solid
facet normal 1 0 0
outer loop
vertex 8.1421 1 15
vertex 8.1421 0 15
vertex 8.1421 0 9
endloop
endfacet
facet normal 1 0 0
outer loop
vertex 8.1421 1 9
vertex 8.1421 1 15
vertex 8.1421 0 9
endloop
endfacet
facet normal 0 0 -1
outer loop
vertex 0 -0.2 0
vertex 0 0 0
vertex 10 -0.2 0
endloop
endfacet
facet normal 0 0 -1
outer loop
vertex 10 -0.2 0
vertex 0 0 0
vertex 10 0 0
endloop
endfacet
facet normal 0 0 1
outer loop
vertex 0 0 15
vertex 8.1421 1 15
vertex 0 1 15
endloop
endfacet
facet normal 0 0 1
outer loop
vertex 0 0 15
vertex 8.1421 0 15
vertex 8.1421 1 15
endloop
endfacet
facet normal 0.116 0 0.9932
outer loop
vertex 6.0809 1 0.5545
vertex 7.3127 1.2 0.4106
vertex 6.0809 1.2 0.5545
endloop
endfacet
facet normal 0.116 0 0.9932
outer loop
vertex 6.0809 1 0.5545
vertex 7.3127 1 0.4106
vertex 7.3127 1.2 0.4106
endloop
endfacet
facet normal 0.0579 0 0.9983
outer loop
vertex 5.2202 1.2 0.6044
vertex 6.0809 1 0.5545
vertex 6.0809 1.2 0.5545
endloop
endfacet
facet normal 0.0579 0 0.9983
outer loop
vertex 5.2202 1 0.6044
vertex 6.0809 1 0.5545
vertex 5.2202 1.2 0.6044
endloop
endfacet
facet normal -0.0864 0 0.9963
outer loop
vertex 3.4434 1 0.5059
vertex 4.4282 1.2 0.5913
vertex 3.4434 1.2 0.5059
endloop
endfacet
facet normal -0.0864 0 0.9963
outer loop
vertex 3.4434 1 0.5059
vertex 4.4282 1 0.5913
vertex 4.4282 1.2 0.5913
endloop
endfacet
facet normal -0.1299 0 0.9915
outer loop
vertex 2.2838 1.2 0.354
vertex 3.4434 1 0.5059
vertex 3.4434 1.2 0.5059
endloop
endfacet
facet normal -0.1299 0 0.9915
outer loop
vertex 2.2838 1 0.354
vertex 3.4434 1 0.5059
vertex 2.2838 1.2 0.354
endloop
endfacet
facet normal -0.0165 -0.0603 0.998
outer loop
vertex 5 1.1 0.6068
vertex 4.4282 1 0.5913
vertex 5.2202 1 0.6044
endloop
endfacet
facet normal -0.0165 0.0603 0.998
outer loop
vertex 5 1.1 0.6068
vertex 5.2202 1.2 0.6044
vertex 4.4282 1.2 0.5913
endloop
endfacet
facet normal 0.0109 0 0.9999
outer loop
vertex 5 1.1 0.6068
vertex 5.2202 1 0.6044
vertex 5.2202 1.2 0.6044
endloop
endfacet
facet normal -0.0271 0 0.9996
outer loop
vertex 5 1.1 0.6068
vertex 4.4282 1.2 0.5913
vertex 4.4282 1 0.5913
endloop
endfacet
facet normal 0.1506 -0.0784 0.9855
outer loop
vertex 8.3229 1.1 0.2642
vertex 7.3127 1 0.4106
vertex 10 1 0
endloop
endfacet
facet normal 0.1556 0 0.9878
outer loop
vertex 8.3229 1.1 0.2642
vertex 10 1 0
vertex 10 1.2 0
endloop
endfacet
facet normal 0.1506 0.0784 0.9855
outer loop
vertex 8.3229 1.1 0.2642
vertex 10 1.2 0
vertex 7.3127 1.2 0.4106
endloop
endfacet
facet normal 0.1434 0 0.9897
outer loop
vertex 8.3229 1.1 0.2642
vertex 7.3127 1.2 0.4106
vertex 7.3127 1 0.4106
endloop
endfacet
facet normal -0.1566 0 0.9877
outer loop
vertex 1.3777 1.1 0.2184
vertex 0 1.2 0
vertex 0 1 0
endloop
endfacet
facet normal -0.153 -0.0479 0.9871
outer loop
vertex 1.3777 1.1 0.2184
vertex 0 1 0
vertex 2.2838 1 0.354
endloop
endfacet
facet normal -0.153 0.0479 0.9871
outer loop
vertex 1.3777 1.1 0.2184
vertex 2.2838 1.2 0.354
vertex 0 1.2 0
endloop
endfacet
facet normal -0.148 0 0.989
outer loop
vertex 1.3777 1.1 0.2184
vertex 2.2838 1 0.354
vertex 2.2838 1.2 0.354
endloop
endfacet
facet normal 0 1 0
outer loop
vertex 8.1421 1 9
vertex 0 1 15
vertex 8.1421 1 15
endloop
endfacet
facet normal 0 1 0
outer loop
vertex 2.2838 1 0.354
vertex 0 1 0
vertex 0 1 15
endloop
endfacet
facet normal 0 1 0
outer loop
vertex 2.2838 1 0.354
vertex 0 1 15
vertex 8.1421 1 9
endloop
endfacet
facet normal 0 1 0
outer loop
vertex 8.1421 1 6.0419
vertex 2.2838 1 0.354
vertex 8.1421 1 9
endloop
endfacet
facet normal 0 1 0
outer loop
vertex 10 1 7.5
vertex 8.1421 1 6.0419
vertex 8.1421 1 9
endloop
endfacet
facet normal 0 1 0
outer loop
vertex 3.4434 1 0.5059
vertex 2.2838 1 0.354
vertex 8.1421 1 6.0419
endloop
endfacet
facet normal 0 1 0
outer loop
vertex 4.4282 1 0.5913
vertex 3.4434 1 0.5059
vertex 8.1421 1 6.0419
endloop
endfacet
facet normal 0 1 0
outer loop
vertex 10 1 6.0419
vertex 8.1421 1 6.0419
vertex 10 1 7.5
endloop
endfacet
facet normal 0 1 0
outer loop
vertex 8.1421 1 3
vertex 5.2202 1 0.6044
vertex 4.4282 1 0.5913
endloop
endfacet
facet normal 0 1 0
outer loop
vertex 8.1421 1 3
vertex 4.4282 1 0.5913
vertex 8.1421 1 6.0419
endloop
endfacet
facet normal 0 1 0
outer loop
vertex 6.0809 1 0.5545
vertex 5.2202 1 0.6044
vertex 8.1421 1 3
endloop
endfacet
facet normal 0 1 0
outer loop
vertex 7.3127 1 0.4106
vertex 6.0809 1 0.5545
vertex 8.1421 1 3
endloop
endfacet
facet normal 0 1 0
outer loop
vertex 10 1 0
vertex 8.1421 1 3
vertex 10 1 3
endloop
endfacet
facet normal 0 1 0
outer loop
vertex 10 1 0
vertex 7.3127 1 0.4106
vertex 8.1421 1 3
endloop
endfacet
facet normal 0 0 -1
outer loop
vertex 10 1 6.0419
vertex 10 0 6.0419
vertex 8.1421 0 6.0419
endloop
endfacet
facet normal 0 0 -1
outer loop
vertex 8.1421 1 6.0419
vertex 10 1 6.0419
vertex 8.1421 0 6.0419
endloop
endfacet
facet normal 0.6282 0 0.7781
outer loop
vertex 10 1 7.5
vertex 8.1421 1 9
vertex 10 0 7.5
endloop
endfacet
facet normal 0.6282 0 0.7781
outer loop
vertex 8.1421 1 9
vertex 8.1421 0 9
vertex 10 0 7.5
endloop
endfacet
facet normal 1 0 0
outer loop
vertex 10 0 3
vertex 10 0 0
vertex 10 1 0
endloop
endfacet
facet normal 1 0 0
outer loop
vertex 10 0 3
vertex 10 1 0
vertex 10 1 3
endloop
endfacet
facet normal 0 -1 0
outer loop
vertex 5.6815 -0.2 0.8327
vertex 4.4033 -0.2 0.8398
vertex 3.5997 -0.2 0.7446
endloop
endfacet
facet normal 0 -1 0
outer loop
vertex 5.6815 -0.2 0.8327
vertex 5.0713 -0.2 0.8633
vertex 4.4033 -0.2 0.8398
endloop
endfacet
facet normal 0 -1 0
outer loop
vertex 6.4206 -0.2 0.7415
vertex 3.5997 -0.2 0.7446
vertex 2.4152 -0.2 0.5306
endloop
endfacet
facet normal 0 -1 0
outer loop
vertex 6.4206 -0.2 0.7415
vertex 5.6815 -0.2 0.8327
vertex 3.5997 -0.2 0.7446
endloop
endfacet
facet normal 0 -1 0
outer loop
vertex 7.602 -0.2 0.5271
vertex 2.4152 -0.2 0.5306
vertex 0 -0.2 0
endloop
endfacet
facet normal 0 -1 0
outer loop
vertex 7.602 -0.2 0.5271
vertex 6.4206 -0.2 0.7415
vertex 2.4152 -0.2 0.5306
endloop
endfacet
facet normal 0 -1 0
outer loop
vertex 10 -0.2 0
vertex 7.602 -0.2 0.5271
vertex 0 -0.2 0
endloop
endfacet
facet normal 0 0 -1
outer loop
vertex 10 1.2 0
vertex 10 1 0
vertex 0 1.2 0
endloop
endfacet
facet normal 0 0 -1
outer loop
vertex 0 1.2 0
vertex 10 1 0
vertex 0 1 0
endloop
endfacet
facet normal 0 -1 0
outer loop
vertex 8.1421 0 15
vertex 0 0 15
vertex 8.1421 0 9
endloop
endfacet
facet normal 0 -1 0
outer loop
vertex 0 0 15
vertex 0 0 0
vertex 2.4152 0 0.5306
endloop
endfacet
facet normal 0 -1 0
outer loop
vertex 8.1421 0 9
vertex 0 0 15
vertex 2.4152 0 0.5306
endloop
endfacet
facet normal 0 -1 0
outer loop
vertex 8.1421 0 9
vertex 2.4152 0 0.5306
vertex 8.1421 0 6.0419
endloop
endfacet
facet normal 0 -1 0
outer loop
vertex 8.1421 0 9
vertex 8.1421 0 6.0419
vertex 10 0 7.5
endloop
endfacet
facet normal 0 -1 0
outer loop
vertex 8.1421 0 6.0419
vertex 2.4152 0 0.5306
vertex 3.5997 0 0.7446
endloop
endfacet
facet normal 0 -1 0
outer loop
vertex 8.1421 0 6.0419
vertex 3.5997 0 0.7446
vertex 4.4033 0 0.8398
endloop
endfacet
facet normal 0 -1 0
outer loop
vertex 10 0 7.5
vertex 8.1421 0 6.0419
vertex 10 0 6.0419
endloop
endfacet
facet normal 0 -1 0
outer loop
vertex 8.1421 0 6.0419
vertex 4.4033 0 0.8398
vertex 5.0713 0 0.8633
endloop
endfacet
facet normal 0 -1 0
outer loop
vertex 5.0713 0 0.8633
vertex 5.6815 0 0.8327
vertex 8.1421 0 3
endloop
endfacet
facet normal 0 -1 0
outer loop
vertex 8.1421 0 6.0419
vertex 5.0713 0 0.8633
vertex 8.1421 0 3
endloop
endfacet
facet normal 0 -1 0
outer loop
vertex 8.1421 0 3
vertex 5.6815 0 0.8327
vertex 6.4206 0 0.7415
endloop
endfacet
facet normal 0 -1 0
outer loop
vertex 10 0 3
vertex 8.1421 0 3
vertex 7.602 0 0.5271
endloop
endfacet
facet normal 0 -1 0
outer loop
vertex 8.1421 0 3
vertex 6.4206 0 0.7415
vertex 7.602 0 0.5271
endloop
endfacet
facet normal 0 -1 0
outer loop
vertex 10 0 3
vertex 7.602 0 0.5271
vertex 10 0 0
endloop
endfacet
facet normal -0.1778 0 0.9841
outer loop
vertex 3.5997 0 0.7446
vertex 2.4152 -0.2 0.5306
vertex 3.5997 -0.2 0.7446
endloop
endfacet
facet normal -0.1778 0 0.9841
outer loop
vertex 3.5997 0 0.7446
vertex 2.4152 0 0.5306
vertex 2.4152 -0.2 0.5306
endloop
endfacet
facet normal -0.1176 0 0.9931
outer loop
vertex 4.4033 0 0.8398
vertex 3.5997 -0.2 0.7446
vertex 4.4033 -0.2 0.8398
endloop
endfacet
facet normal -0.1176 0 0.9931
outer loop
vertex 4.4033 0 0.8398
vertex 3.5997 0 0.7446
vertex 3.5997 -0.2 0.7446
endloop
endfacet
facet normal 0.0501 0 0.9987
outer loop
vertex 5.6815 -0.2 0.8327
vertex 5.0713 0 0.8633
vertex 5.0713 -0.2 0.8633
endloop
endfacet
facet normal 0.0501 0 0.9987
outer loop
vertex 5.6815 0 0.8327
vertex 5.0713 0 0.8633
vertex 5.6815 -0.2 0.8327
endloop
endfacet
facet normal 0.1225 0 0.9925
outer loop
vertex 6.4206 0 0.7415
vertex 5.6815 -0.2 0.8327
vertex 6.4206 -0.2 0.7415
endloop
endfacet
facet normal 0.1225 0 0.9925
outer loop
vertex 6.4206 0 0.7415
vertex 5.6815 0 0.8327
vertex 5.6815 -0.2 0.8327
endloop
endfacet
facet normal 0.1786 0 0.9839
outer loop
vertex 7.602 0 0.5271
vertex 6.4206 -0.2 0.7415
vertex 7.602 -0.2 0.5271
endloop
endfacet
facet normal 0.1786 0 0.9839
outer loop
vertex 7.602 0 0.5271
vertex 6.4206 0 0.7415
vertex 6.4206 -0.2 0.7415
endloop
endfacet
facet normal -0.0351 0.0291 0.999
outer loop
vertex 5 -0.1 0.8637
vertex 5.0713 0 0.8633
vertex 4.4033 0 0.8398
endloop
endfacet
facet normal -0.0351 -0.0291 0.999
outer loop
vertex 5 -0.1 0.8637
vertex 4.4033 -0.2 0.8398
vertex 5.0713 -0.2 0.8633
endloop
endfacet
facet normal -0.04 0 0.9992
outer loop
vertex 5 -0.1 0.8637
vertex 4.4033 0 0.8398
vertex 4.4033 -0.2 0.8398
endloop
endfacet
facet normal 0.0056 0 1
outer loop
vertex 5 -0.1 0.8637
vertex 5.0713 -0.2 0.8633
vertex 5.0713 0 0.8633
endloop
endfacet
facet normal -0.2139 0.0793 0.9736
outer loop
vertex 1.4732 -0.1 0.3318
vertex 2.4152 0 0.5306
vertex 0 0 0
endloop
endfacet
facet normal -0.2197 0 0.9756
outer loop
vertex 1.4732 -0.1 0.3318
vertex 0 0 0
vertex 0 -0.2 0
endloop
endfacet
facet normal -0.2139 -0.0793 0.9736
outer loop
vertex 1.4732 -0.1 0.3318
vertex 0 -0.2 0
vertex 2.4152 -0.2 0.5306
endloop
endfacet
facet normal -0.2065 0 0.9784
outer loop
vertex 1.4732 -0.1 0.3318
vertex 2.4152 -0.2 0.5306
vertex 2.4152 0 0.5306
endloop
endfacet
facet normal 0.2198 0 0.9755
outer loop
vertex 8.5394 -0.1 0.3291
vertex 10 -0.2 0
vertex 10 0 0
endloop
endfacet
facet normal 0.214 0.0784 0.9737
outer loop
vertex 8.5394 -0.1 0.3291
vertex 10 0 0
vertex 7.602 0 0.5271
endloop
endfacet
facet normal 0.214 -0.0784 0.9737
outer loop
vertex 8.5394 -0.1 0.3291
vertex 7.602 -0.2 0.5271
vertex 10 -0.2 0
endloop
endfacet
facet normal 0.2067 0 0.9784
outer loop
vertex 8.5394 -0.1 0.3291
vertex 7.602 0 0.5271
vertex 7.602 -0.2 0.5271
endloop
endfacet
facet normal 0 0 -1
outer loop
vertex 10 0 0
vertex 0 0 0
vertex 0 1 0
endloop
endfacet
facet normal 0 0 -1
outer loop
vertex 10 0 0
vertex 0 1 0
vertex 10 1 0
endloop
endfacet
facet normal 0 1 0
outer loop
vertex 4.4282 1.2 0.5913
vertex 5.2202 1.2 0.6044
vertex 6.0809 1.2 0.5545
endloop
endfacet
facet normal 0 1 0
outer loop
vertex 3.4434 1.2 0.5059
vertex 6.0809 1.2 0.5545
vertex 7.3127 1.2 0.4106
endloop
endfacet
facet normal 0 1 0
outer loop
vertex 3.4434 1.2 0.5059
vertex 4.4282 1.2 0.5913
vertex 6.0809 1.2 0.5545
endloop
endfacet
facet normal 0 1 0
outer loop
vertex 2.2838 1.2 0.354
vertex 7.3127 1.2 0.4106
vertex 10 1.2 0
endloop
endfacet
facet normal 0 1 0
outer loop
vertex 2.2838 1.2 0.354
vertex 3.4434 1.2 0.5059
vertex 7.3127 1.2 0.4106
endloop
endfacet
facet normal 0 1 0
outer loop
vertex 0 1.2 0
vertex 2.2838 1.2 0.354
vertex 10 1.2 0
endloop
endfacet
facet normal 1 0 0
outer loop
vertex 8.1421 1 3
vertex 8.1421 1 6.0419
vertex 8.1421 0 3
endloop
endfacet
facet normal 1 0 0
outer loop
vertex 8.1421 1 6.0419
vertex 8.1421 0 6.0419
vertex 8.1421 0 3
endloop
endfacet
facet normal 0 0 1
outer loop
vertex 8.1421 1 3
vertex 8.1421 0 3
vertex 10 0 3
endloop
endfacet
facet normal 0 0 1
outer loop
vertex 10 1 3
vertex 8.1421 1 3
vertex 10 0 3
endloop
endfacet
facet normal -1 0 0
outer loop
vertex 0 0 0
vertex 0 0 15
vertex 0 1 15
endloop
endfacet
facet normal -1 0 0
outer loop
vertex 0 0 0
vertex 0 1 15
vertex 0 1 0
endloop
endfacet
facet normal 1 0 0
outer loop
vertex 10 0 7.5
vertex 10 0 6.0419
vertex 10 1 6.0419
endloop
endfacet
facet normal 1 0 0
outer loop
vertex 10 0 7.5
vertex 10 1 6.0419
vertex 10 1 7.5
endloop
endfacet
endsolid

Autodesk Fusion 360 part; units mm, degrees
sketch "草图1" plane through (0, 0, 0) normal (0, 1, 0) x (1, 0, 0)
  line L0 (0, 0) -> (10, 0)
  line L1 (8.1421, -15) -> (0, -15)
  line L2 (0, -15) -> (0, 0)
  line L3 (8.1421, -15) -> (8.1421, -9)
  line L4 (8.1421, -9) -> (10, -7.5)
  line L5 (10, -6.0419) -> (8.1421, -6.0419)
  line L6 (8.1421, -6.0419) -> (8.1421, -3)
  line L7 (8.1421, -3) -> (10, -3)
  line L8 (10, 0) -> (10, -3)
  line L9 (10, -6.0419) -> (10, -7.5)
  dimension "d1" = 10
  dimension "d2" = 15
extrude "拉伸1" add sketch "草图1" along normal blind 1
sketch "草图2" plane through (0, 0, 0) normal (0, -1, 0) x (1, 0, 0)
  line L0 (8.1421, 3) -> (8.1421, 6.0419)
  line L1 (8.1421, 6.0419) -> (10, 6.0419)
  line L2 (10, 6.0419) -> (10, 7.5)
  line L3 (10, 7.5) -> (8.1421, 9)
  line L4 (8.1421, 9) -> (8.1421, 15)
  line L5 (8.1421, 15) -> (0, 15)
  line L6 (0, 15) -> (0, 0)
  line L7 (0, 0) -> (10, 0)
  line L8 (10, 0) -> (10, 3)
  line L9 (10, 3) -> (8.1421, 3)
  spline S0 degree 2 poles (0, 0) (5, 1.1516) (10, 0) knots 0 0 0 1.014809 1.014809 1.014809 weights 1 3 1
extrude "拉伸2" add sketch "草图2" along normal blind 0.2 contours L7 S0
sketch "草图3" plane through (0, 1, 0) normal (0, 1, 0) x (-1, 0, 0)
  line L0 (-8.1421, 6.0419) -> (-8.1421, 3)
  line L1 (-8.1421, 3) -> (-10, 3)
  line L2 (-10, 3) -> (-10, 0)
  line L3 (-10, 0) -> (0, 0)
  line L4 (0, 0) -> (0, 15)
  line L5 (0, 15) -> (-8.1421, 15)
  line L6 (-8.1421, 15) -> (-8.1421, 9)
  line L7 (-8.1421, 9) -> (-10, 7.5)
  line L8 (-10, 7.5) -> (-10, 6.0419)
  line L9 (-10, 6.0419) -> (-8.1421, 6.0419)
  spline S0 degree 2 poles (-10, 0) (-5, 0.809) (0, 0) knots 0 0 0 1.007336 1.007336 1.007336 weights 1 3 1
extrude "拉伸3" add sketch "草图3" along normal blind 0.2 contours L3 S0
